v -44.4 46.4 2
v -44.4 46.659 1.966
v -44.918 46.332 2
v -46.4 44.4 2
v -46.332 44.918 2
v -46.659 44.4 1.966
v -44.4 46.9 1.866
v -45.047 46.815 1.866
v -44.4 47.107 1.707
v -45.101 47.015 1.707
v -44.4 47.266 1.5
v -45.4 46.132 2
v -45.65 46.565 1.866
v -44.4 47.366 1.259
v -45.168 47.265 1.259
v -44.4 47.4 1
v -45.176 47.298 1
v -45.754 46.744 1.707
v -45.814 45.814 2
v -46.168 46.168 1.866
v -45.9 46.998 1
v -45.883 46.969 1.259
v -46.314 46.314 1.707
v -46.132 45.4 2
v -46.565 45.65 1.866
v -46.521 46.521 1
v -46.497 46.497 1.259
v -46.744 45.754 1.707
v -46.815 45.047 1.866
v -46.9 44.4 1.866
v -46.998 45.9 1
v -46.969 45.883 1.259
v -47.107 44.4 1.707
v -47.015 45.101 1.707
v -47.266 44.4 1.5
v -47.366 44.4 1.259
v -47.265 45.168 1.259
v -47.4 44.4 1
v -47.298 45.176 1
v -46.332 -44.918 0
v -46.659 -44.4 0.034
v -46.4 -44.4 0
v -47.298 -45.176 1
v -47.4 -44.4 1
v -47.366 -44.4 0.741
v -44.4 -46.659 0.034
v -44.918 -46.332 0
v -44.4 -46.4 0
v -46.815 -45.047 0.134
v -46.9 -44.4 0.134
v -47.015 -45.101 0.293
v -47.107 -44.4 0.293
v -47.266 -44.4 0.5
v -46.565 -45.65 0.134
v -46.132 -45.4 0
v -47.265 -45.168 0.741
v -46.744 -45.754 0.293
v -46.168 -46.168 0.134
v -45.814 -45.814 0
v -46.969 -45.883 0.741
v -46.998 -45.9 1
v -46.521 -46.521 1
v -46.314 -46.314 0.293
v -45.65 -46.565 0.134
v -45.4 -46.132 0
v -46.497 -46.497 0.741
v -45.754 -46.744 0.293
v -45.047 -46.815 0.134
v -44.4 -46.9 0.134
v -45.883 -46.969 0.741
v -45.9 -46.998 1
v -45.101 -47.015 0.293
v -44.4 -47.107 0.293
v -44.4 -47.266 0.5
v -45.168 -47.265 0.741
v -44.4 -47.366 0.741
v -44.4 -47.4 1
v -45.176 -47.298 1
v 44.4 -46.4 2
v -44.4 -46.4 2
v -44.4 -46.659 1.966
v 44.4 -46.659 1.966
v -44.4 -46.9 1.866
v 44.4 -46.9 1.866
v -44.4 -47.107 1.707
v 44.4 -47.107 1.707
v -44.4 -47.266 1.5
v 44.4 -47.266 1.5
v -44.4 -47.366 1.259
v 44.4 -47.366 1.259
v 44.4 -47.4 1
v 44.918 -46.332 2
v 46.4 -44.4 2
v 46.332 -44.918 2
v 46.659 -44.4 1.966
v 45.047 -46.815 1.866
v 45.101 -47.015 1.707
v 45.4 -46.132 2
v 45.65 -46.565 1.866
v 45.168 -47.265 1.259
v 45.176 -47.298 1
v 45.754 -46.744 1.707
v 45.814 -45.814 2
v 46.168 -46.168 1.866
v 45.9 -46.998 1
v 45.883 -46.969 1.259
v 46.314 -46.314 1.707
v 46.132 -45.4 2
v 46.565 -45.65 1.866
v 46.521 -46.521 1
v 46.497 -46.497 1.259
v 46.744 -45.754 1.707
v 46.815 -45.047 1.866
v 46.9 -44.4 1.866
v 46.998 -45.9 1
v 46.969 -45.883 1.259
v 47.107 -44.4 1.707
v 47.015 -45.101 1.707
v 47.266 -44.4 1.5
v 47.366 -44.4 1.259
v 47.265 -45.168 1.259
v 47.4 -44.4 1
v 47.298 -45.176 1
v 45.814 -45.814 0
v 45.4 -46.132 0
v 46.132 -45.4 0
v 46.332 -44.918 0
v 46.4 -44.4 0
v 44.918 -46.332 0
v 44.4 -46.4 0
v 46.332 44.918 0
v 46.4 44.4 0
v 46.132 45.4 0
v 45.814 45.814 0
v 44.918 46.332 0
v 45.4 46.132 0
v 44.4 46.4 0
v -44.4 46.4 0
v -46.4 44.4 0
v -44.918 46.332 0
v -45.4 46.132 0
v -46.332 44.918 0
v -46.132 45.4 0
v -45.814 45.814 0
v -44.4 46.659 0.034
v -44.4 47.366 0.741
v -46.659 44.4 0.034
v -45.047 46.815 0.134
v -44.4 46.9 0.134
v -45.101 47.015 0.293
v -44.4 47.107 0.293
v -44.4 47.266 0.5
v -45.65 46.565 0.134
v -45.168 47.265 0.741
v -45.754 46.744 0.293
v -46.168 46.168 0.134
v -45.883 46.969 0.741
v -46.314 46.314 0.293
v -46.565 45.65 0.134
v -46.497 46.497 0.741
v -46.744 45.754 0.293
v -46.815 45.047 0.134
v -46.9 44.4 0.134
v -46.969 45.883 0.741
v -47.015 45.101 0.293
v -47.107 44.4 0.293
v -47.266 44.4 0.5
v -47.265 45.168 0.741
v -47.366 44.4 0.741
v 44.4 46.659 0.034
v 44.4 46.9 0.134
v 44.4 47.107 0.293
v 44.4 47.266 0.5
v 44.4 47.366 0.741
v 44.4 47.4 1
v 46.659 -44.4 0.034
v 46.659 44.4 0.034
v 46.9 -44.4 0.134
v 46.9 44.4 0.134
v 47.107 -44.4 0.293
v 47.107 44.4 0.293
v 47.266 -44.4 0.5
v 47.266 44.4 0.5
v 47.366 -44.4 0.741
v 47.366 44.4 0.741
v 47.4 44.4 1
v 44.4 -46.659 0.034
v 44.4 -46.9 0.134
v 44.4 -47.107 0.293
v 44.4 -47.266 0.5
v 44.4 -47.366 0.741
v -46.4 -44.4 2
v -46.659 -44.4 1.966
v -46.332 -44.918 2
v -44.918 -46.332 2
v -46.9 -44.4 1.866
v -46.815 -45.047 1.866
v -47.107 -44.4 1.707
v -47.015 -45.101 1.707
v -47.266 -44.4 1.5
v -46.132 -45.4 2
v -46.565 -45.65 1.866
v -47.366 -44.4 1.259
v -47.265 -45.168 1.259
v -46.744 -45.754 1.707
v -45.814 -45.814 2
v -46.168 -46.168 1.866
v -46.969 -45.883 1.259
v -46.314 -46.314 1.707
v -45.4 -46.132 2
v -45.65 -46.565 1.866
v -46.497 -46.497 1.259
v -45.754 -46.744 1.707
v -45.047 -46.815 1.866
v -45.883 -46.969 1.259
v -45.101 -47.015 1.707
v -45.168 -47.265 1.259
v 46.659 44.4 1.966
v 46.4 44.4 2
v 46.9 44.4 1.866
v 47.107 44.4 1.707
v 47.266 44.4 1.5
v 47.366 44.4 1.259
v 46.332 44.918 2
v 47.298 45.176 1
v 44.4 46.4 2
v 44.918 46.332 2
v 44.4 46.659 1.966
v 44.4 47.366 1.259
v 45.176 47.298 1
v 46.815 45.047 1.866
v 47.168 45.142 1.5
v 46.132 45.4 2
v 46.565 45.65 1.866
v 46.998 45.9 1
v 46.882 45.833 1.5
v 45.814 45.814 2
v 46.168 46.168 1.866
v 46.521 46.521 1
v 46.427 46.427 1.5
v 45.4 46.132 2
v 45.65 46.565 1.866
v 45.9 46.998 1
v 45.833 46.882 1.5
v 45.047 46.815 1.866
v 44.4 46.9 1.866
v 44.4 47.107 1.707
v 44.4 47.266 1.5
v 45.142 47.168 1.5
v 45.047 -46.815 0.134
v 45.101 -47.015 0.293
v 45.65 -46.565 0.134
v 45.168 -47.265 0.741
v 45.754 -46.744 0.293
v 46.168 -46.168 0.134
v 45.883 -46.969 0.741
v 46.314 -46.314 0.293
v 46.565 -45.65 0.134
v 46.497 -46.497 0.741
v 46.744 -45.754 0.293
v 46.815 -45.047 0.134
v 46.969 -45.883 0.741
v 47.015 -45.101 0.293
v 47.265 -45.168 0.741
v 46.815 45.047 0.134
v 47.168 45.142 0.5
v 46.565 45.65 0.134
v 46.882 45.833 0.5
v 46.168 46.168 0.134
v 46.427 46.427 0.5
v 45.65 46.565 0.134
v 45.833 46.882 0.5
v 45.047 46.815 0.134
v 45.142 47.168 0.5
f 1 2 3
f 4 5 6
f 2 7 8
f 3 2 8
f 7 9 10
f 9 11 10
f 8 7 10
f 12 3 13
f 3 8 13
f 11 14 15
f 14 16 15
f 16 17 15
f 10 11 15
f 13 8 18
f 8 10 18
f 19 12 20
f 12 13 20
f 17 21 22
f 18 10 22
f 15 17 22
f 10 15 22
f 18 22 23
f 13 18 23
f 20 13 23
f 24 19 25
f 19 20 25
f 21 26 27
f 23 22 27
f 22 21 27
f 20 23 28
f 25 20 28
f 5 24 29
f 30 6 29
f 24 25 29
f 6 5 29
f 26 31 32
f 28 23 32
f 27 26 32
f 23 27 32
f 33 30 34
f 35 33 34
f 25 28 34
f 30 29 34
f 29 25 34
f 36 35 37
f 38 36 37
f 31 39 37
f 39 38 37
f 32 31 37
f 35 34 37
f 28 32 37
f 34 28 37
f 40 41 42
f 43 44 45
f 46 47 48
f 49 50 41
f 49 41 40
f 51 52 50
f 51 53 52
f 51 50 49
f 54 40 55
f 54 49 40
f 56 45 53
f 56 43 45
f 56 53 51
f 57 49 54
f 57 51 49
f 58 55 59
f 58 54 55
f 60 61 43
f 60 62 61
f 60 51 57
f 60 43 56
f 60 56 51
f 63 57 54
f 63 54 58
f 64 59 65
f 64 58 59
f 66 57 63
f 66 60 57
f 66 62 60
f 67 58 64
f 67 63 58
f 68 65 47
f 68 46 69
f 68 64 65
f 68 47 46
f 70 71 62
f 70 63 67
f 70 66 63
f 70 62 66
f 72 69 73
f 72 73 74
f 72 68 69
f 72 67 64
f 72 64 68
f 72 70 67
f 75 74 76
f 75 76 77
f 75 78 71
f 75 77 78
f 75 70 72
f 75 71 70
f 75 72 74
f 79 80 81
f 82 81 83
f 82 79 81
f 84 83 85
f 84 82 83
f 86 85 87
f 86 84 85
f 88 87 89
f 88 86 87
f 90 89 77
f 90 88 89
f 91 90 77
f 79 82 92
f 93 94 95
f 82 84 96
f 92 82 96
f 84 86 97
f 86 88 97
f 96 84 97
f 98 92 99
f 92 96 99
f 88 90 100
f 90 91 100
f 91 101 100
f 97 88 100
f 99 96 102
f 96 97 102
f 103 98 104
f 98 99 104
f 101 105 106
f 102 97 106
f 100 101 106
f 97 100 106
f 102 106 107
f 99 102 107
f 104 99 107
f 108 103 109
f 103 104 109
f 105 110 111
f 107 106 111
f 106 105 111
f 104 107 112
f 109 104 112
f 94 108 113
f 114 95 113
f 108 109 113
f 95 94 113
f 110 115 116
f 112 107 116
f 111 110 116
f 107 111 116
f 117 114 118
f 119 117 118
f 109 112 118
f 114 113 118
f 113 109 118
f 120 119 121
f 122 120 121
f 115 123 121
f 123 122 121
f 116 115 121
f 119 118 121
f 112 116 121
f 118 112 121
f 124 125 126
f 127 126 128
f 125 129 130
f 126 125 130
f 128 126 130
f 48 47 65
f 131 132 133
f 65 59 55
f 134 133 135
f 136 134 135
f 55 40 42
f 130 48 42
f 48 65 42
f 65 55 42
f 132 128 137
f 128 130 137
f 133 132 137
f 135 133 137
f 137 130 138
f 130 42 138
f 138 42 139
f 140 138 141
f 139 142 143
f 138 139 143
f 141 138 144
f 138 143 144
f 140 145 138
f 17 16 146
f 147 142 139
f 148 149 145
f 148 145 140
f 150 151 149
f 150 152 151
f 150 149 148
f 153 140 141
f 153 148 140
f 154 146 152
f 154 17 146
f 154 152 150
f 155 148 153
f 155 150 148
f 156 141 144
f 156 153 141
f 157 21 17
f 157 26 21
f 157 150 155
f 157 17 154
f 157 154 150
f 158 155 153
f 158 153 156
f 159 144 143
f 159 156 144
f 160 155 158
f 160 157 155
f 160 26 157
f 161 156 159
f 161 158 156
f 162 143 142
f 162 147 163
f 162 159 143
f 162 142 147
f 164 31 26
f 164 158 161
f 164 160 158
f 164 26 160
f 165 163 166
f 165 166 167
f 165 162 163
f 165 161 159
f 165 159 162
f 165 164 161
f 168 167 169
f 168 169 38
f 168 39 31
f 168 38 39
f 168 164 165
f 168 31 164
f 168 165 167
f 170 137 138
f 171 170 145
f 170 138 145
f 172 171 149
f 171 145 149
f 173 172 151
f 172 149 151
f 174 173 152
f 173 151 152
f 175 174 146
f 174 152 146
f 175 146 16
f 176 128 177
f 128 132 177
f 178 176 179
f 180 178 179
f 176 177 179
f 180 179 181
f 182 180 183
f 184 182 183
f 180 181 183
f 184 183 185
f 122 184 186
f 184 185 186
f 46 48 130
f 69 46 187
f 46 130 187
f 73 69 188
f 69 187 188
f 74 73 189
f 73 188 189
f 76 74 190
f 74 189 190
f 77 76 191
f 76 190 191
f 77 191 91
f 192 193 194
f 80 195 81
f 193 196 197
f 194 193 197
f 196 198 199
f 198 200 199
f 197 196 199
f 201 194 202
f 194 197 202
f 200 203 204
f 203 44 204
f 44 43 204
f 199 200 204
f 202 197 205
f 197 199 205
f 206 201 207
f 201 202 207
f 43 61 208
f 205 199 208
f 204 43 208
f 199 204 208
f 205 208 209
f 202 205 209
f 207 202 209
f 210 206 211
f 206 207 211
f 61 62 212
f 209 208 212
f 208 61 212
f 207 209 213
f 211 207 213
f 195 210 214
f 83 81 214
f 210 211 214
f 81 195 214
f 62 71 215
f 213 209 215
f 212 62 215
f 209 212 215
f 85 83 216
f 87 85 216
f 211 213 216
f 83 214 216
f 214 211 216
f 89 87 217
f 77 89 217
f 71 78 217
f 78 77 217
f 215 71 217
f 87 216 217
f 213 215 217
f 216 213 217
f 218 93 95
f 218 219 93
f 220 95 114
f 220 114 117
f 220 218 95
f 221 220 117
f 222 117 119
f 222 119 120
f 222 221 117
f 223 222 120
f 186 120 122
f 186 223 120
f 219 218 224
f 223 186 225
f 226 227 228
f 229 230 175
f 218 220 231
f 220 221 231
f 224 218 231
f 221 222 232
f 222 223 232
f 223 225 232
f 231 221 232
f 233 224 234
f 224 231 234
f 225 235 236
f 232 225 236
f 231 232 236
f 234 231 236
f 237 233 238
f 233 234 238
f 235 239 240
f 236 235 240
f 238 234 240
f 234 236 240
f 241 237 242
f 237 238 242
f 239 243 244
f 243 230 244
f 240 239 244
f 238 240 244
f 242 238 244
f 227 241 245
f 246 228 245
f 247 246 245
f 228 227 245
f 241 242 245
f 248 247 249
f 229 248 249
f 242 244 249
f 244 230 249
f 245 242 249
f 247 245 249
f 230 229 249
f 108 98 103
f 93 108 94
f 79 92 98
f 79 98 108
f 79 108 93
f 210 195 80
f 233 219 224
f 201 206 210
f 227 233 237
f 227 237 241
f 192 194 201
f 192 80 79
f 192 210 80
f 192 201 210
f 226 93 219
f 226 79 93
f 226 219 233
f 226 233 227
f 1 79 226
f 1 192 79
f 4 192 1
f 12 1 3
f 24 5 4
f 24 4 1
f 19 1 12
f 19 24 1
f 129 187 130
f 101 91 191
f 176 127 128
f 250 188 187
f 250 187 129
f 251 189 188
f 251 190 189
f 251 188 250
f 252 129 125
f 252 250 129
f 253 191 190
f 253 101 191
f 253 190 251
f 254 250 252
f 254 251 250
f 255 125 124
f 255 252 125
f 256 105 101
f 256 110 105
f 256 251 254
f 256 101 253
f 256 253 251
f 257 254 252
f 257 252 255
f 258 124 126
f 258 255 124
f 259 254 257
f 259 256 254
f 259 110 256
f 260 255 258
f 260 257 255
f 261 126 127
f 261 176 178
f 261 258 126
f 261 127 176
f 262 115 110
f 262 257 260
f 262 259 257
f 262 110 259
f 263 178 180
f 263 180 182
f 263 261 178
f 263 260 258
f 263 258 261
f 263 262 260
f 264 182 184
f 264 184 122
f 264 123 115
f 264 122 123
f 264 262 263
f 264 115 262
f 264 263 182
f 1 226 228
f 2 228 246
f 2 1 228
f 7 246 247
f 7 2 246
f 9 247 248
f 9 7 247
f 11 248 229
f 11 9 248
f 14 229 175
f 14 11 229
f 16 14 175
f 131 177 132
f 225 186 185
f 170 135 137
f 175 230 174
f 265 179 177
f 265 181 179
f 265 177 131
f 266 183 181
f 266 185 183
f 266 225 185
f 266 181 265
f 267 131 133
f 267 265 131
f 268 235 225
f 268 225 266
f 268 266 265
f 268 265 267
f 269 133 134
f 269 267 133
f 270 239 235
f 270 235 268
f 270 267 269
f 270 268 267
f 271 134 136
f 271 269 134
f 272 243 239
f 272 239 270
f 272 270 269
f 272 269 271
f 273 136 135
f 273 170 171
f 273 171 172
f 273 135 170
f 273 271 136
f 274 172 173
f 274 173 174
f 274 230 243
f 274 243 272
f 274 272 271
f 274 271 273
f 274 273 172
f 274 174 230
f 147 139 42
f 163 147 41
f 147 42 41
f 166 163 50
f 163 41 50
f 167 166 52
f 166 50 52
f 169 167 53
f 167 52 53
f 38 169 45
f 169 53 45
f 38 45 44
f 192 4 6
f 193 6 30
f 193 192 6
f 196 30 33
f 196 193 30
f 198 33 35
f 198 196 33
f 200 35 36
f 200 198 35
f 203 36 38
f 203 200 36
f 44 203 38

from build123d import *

# Parameters (mm, degrees)
SKETCH1_W           = 94.8
SKETCH1_H           = 94.8
BOSS_EXTRUDE1_DEPTH = 2
FILLET1_R           = 3
FILLET2_R           = 1


with BuildPart() as part:
    # Sketch1 → Boss-Extrude1 (new body)
    with BuildSketch(Plane(origin=(0, 0, 0), x_dir=(0, 1, 0), z_dir=(0, 0, 1))):
        Rectangle(SKETCH1_W, SKETCH1_H)
    extrude(amount=BOSS_EXTRUDE1_DEPTH)

    # Fillet1
    fillet1_edges = [part.edges().sort_by_distance(p)[0] for p in [
        (-47.4, -47.4, 1),
        (-47.4, 47.4, 1),
        (47.4, 47.4, 1),
        (47.4, -47.4, 1),
    ]]
    fillet(fillet1_edges, radius=FILLET1_R)

    # Fillet2
    fillet2_edges = [part.edges().sort_by_distance(p)[0] for p in [
        (46.521320344, 46.521320344, 0),
        (47.4, 0, 0),
        (46.521320344, -46.521320344, 0),
        (0, -47.4, 0),
        (-46.521320344, -46.521320344, 0),
        (-47.4, 0, 0),
        (-46.521320344, 46.521320344, 0),
        (46.521320344, 46.521320344, 2),
        (47.4, 0, 2),
        (46.521320344, -46.521320344, 2),
        (0, -47.4, 2),
        (-46.521320344, -46.521320344, 2),
        (-47.4, 0, 2),
        (-46.521320344, 46.521320344, 2),
        (0, 47.4, 2),
        (0, 47.4, 0),
    ]]
    fillet(fillet2_edges, radius=FILLET2_R - 0.0001)  # a hair under: the kernel refuses the full size


solid = part.part
